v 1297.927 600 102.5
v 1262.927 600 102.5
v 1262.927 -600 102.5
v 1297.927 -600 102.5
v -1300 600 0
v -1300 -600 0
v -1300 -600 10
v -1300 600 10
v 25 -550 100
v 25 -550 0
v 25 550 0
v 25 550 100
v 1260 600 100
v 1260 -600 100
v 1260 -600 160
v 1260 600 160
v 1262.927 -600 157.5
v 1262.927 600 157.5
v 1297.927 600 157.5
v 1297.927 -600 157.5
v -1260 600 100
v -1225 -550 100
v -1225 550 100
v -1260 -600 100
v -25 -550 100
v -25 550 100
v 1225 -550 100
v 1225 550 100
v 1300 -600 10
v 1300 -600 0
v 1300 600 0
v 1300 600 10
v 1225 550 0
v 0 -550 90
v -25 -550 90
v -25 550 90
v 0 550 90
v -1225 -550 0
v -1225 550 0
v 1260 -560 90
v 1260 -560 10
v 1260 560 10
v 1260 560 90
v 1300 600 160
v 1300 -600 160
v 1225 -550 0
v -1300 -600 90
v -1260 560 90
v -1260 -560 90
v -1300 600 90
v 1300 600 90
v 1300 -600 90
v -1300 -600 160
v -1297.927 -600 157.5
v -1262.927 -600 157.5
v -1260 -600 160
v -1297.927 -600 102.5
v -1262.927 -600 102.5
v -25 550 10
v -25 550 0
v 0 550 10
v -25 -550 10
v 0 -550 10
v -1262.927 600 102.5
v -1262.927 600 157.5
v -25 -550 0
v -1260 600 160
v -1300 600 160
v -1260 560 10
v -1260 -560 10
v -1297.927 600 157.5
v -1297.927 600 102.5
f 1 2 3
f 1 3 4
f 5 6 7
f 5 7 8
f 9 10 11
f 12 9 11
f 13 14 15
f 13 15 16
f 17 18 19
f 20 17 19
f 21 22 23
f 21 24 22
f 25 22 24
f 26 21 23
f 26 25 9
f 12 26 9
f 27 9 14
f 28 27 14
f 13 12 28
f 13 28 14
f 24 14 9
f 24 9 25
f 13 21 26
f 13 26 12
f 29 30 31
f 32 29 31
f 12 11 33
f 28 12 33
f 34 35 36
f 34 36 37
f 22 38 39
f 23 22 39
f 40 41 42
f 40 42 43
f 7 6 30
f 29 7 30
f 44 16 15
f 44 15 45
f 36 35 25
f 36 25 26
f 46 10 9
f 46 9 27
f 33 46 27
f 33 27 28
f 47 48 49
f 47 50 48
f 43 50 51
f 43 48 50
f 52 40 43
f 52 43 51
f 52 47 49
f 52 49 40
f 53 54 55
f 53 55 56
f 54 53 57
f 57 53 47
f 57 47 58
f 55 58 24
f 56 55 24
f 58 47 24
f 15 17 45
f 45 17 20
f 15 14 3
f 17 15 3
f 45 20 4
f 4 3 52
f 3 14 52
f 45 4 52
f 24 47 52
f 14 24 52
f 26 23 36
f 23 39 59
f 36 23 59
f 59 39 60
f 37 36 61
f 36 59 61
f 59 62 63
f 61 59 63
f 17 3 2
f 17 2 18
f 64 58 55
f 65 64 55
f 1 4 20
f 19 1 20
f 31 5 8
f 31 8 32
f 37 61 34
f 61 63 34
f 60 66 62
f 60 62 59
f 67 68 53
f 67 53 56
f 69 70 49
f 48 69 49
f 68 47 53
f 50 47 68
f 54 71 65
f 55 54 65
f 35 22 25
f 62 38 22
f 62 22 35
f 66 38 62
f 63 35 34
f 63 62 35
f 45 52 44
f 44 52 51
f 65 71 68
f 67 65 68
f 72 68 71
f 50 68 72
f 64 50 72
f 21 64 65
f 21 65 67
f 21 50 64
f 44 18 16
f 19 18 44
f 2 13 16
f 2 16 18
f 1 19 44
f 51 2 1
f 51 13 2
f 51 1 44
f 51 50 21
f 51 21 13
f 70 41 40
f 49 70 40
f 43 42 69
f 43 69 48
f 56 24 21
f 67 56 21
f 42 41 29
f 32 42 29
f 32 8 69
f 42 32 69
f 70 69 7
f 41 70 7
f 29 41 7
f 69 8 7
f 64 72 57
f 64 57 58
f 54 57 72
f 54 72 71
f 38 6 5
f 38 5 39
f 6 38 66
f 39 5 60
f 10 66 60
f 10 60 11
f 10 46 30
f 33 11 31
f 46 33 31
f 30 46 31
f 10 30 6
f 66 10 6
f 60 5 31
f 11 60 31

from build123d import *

# Parameters (mm, degrees)
F0_W          = 2600
F0_H          = 1200
F0_W_2        = 1200
F0_H_2        = 1100
F1_DEPTH      = 100
F2_W          = 40
F2_H          = 80
F3_DEPTH      = 2600.001
F4_W          = 40
F4_H          = 80
F5_DEPTH      = 1160.001
F6_W          = 90
F6_H          = 80
F7_DEPTH      = 550
F7_DEPTH_BACK = 550
F8_W          = 40
F8_H          = 1200
F9_DEPTH      = 60
F10_W         = 35
F10_H         = 55
F11_DEPTH     = 1200.001


with BuildPart() as f1:
    # F0 (on Top) → F1 (new body)
    with BuildSketch(Plane.XY):
        Rectangle(F0_W, F0_H)
        with Locations((-625, 0)):
            Rectangle(F0_W_2, F0_H_2, mode=Mode.SUBTRACT)
        with Locations((625, 0)):
            Rectangle(F0_W_2, F0_H_2, mode=Mode.SUBTRACT)
    extrude(amount=F1_DEPTH)

    # F2 (on face) → F3 (cut, through all)
    with BuildSketch(Plane(origin=(-1300, 0, 0), x_dir=(0, -1, 0), z_dir=(-1, 0, 0))):
        with Locations((-580, 50)):
            Rectangle(F2_W, F2_H)
        with Locations((580, 50)):
            Rectangle(F2_W, F2_H)
    extrude(amount=-F3_DEPTH, mode=Mode.SUBTRACT)

    # F4 (on face) → F5 (cut, through all)
    with BuildSketch(Plane.XZ.offset(560)):
        with Locations((1280, 50)):
            Rectangle(F4_W, F4_H)
        with Locations((-1280, 50)):
            Rectangle(F4_W, F4_H)
    extrude(amount=-F5_DEPTH, mode=Mode.SUBTRACT)

    # F6 (on Front) → F7 (cut, two sides)
    with BuildSketch(Plane.XZ) as f7_sk:
        with Locations((-45, 50)):
            Rectangle(F6_W, F6_H)
    extrude(amount=-F7_DEPTH, mode=Mode.SUBTRACT)
    extrude(f7_sk.sketch, amount=F7_DEPTH_BACK, mode=Mode.SUBTRACT)

    # F8 (on face) → F9 (join)
    with BuildSketch(Plane.XY.offset(100)):
        with Locations((-1280, 0)):
            Rectangle(F8_W, F8_H)
        with Locations((1280, 0)):
            Rectangle(F8_W, F8_H)
    extrude(amount=F9_DEPTH)

    # F10 (on face) → F11 (cut, through all)
    with BuildSketch(Plane.XZ.offset(600)):
        with Locations((1280.4266214371, 130)):
            Rectangle(F10_W, F10_H)
        with Locations((-1280.4266214371, 130)):
            Rectangle(F10_W, F10_H)
    extrude(amount=-F11_DEPTH, mode=Mode.SUBTRACT)


solid = f1.part
